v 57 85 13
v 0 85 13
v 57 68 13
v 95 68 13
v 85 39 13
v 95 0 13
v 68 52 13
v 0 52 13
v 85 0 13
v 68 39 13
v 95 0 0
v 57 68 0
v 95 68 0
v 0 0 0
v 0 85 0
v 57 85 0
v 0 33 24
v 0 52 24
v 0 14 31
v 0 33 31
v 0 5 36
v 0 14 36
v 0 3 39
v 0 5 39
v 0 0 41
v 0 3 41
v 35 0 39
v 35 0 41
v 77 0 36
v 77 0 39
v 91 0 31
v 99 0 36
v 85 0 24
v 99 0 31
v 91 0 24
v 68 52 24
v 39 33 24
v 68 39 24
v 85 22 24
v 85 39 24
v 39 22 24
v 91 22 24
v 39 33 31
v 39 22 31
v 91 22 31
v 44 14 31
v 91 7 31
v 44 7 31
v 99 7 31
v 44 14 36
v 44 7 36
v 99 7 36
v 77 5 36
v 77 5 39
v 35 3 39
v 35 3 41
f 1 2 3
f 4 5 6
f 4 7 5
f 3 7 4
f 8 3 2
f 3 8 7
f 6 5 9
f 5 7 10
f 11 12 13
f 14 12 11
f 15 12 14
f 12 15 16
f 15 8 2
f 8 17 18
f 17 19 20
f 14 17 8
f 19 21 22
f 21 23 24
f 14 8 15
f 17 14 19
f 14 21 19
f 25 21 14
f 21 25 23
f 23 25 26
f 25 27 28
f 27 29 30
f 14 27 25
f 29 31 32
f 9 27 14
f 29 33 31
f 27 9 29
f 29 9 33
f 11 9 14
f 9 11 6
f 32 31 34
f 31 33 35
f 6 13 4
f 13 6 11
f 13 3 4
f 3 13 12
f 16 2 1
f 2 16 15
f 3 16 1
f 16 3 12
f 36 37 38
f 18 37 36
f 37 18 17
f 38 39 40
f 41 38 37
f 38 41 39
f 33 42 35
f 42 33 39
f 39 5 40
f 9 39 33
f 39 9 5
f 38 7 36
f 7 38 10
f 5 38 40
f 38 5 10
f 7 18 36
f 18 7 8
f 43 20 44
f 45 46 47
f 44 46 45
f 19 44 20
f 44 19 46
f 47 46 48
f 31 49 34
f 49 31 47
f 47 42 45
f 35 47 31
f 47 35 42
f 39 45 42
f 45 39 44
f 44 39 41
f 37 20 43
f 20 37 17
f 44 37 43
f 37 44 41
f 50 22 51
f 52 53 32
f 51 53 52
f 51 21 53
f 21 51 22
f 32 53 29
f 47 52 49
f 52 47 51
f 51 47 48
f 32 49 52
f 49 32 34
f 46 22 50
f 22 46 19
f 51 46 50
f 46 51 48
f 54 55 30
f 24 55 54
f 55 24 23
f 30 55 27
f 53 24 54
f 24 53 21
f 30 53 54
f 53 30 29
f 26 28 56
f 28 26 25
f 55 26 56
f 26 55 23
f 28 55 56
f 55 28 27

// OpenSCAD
translate([9.5, 8.5, 6.5]) color([0.04413950751599882, 0.6453929548117466, 0.6988419541065013]) cube([19, 17, 13], center=true);
translate([28.5, 8.5, 6.5]) color([0.7967664255910738, 0.9116718921976609, 0.600448770579328]) cube([19, 17, 13], center=true);
translate([47.5, 8.5, 6.5]) color([0.7944487907838055, 0.1681613799771936, 0.9183995562433641]) cube([19, 17, 13], center=true);
translate([66.5, 8.5, 6.5]) color([0.9268586566852167, 0.40822611044352053, 0.4407066729290805]) cube([19, 17, 13], center=true);
translate([85.5, 8.5, 6.5]) color([0.6041418306666712, 0.6201352905963935, 0.25582819932935885]) cube([19, 17, 13], center=true);
translate([9.5, 25.5, 6.5]) color([0.3097428572381714, 0.8490920052212889, 0.453637908490201]) cube([19, 17, 13], center=true);
translate([28.5, 25.5, 6.5]) color([0.18066627555108494, 0.4537290543496928, 0.2641493990309046]) cube([19, 17, 13], center=true);
translate([47.5, 25.5, 6.5]) color([0.9492851375614021, 0.06409274308092405, 0.09630522223834415]) cube([19, 17, 13], center=true);
translate([66.5, 25.5, 6.5]) color([0.02618666999626429, 0.02133712304448243, 0.40376331371079255]) cube([19, 17, 13], center=true);
translate([85.5, 25.5, 6.5]) color([0.6905719463038024, 0.8969992176715027, 0.32280326974746465]) cube([19, 17, 13], center=true);
translate([9.5, 42.5, 6.5]) color([0.790755737975632, 0.7460115169857665, 0.6948475129606672]) cube([19, 17, 13], center=true);
translate([28.5, 42.5, 6.5]) color([0.47653257906772517, 0.8579766307154586, 0.5356136848189613]) cube([19, 17, 13], center=true);
translate([47.5, 42.5, 6.5]) color([0.4019331618452773, 0.783713898498177, 0.9254696984756191]) cube([19, 17, 13], center=true);
translate([66.5, 42.5, 6.5]) color([0.0277966234683793, 0.5158650286176655, 0.8365998776746773]) cube([19, 17, 13], center=true);
translate([85.5, 42.5, 6.5]) color([0.08009244005093674, 0.35854963179787425, 0.0984859129144442]) cube([19, 17, 13], center=true);
translate([9.5, 59.5, 6.5]) color([0.9681463616569913, 0.1542718478221884, 0.5165971564168642]) cube([19, 17, 13], center=true);
translate([28.5, 59.5, 6.5]) color([0.8047430089643692, 0.9598305824160865, 0.0007265089205383823]) cube([19, 17, 13], center=true);
translate([47.5, 59.5, 6.5]) color([0.33769105491683293, 0.9444140087685011, 0.6959768172121321]) cube([19, 17, 13], center=true);
translate([66.5, 59.5, 6.5]) color([0.16055826227824588, 0.7793255516951493, 0.1589752259859445]) cube([19, 17, 13], center=true);
translate([85.5, 59.5, 6.5]) color([0.6798370424105331, 0.9431536263145228, 0.9341404857092784]) cube([19, 17, 13], center=true);
translate([9.5, 76.5, 6.5]) color([0.32827049453258017, 0.023848105094706917, 0.9585798448912861]) cube([19, 17, 13], center=true);
translate([28.5, 76.5, 6.5]) color([0.6258377632382796, 0.3981042954636257, 0.2264255750200933]) cube([19, 17, 13], center=true);
translate([47.5, 76.5, 6.5]) color([0.6356717667101055, 0.328569085672622, 0.9662245753272395]) cube([19, 17, 13], center=true);
translate([8.5, 6.5, 18.5]) color([0.3520821722301851, 0.16362135021644642, 0.42074777530803376]) cube([17, 13, 11], center=true);
translate([25.5, 6.5, 18.5]) color([0.36328644213461747, 0.5653807754665455, 0.3865100485452896]) cube([17, 13, 11], center=true);
translate([42.5, 6.5, 18.5]) color([0.7707594112565195, 0.16214085318372695, 0.5836514905515098]) cube([17, 13, 11], center=true);
translate([59.5, 6.5, 18.5]) color([0.6869400768720183, 0.718467099976435, 0.17196229100139104]) cube([17, 13, 11], center=true);
translate([76.5, 6.5, 18.5]) color([0.14887881293527583, 0.025166107893626943, 0.32332346968418324]) cube([17, 13, 11], center=true);
translate([8.5, 19.5, 18.5]) color([0.003696799562737496, 0.04720529747843194, 0.9255571895234466]) cube([17, 13, 11], center=true);
translate([25.5, 19.5, 18.5]) color([0.573001262631075, 0.14769469781462263, 0.15315209085934545]) cube([17, 13, 11], center=true);
translate([42.5, 19.5, 18.5]) color([0.7868491215994531, 0.7877029182496789, 0.4187372508366701]) cube([17, 13, 11], center=true);
translate([59.5, 19.5, 18.5]) color([0.5680438273675328, 0.6864311496386182, 0.7112052310106062]) cube([17, 13, 11], center=true);
translate([76.5, 19.5, 18.5]) color([0.9225367392437966, 0.36402675889620517, 0.21666285047939615]) cube([17, 13, 11], center=true);
translate([8.5, 32.5, 18.5]) color([0.40038769746607716, 0.12979762559949215, 0.5661089096865166]) cube([17, 13, 11], center=true);
translate([25.5, 32.5, 18.5]) color([0.350592866287013, 0.09655676358596321, 0.8957043173613797]) cube([17, 13, 11], center=true);
translate([42.5, 32.5, 18.5]) color([0.24564542972396286, 0.3817592950540295, 0.9163373365613642]) cube([17, 13, 11], center=true);
translate([59.5, 32.5, 18.5]) color([0.24005472395766314, 0.4811830401201487, 0.9204180358452778]) cube([17, 13, 11], center=true);
translate([76.5, 32.5, 18.5]) color([0.06901768472479497, 0.25236871091997304, 0.2758752397078251]) cube([17, 13, 11], center=true);
translate([8.5, 45.5, 18.5]) color([0.526585946767007, 0.5423400552699501, 0.6040332809955223]) cube([17, 13, 11], center=true);
translate([25.5, 45.5, 18.5]) color([0.7795947303962014, 0.8767515811101877, 0.27628184885013174]) cube([17, 13, 11], center=true);
translate([42.5, 45.5, 18.5]) color([0.6109665581700968, 0.8673330381368943, 0.39077563557117434]) cube([17, 13, 11], center=true);
translate([59.5, 45.5, 18.5]) color([0.6261021875341246, 0.5344719952169016, 0.8525626141482417]) cube([17, 13, 11], center=true);
translate([6.5, 5.5, 27.5]) color([0.1442072370162294, 0.39242938925918713, 0.7677442686337953]) cube([13, 11, 7], center=true);
translate([19.5, 5.5, 27.5]) color([0.7310024639236243, 0.976490023680837, 0.432956620488795]) cube([13, 11, 7], center=true);
translate([32.5, 5.5, 27.5]) color([0.10481875176128097, 0.4606863677813431, 0.461987586031698]) cube([13, 11, 7], center=true);
translate([45.5, 5.5, 27.5]) color([0.16960878923904732, 0.4743590683571708, 0.15900931947085895]) cube([13, 11, 7], center=true);
translate([58.5, 5.5, 27.5]) color([0.9184122383299332, 0.8645912802495788, 0.7618309073415613]) cube([13, 11, 7], center=true);
translate([71.5, 5.5, 27.5]) color([0.1125156501937501, 0.36828247715101237, 0.14269334546182144]) cube([13, 11, 7], center=true);
translate([84.5, 5.5, 27.5]) color([0.3576212954978014, 0.47267833076618404, 0.5187172796832821]) cube([13, 11, 7], center=true);
translate([6.5, 16.5, 27.5]) color([0.05390524264941354, 0.8771386739413267, 0.25763233882857706]) cube([13, 11, 7], center=true);
translate([19.5, 16.5, 27.5]) color([0.7234564765071956, 0.3246711887124375, 0.3801134723009394]) cube([13, 11, 7], center=true);
translate([32.5, 16.5, 27.5]) color([0.04146251299314507, 0.5514350789130729, 0.03490092368589748]) cube([13, 11, 7], center=true);
translate([45.5, 16.5, 27.5]) color([0.4105469306488987, 0.3751623833766272, 0.20817480494735885]) cube([13, 11, 7], center=true);
translate([58.5, 16.5, 27.5]) color([0.13416269520041413, 0.11029894361740877, 0.3569637027811857]) cube([13, 11, 7], center=true);
translate([71.5, 16.5, 27.5]) color([0.03122581862343432, 0.5766961902260587, 0.46351932045943167]) cube([13, 11, 7], center=true);
translate([84.5, 16.5, 27.5]) color([0.6418946885374921, 0.7070356211127606, 0.07782501561786981]) cube([13, 11, 7], center=true);
translate([6.5, 27.5, 27.5]) color([0.42542790282452947, 0.7262099352025745, 0.1383007479401901]) cube([13, 11, 7], center=true);
translate([19.5, 27.5, 27.5]) color([0.15296819960671582, 0.16447153857536234, 0.02972250823157674]) cube([13, 11, 7], center=true);
translate([32.5, 27.5, 27.5]) color([0.13555611535148748, 0.49304209170471214, 0.8998582652350663]) cube([13, 11, 7], center=true);
translate([5.5, 3.5, 33.5]) color([0.6233506257524957, 0.28803948846792526, 0.7932252536354372]) cube([11, 7, 5], center=true);
translate([16.5, 3.5, 33.5]) color([0.6841926136499455, 0.8025617596714979, 0.9141286153689818]) cube([11, 7, 5], center=true);
translate([27.5, 3.5, 33.5]) color([0.8380916000073253, 0.7734206085146829, 0.26176851167691584]) cube([11, 7, 5], center=true);
translate([38.5, 3.5, 33.5]) color([0.15831969188506612, 0.6279762350139132, 0.968532274155243]) cube([11, 7, 5], center=true);
translate([49.5, 3.5, 33.5]) color([0.5331314108905011, 0.14458049768334114, 0.3761389701406963]) cube([11, 7, 5], center=true);
translate([60.5, 3.5, 33.5]) color([0.7397992144806613, 0.5554788507911738, 0.2345364606417215]) cube([11, 7, 5], center=true);
translate([71.5, 3.5, 33.5]) color([0.9148239194796951, 0.37856658806298793, 0.39026506951982043]) cube([11, 7, 5], center=true);
translate([82.5, 3.5, 33.5]) color([0.4712732695903361, 0.3061585200178283, 0.41010119017851343]) cube([11, 7, 5], center=true);
translate([93.5, 3.5, 33.5]) color([0.4062986061941243, 0.09771277519641097, 0.9732189413459187]) cube([11, 7, 5], center=true);
translate([5.5, 10.5, 33.5]) color([0.1476462111243403, 0.5834920525213394, 0.6340513654385499]) cube([11, 7, 5], center=true);
translate([16.5, 10.5, 33.5]) color([0.981030210372344, 0.8814881035470955, 0.10681393516694448]) cube([11, 7, 5], center=true);
translate([27.5, 10.5, 33.5]) color([0.7792822990369496, 0.6980706766614326, 0.5957858833990998]) cube([11, 7, 5], center=true);
translate([38.5, 10.5, 33.5]) color([0.6031315697857828, 0.513452068799622, 0.26667928463625334]) cube([11, 7, 5], center=true);
translate([3.5, 2.5, 37.5]) color([0.7319196359388911, 0.16863726359497544, 0.08537701363375594]) cube([7, 5, 3], center=true);
translate([10.5, 2.5, 37.5]) color([0.03602107622091366, 0.11539851048895433, 0.362166522572666]) cube([7, 5, 3], center=true);
translate([17.5, 2.5, 37.5]) color([0.7224633804016175, 0.31835367611154275, 0.6759746033894163]) cube([7, 5, 3], center=true);
translate([24.5, 2.5, 37.5]) color([0.3690945326108701, 0.6966804657420774, 0.6665423027167577]) cube([7, 5, 3], center=true);
translate([31.5, 2.5, 37.5]) color([0.8120877428034601, 0.22871566506275376, 0.1590470788005368]) cube([7, 5, 3], center=true);
translate([38.5, 2.5, 37.5]) color([0.551630898022963, 0.8946771329487354, 0.7805199910429719]) cube([7, 5, 3], center=true);
translate([45.5, 2.5, 37.5]) color([0.5079920956553113, 0.8859418345093829, 0.025781518425698202]) cube([7, 5, 3], center=true);
translate([52.5, 2.5, 37.5]) color([0.6432115126368863, 0.16681516080095515, 0.9937350713993572]) cube([7, 5, 3], center=true);
translate([59.5, 2.5, 37.5]) color([0.40890136814306854, 0.6606487125760558, 0.4381854363391663]) cube([7, 5, 3], center=true);
translate([66.5, 2.5, 37.5]) color([0.6836690634862878, 0.2641275750187716, 0.5874382639994257]) cube([7, 5, 3], center=true);
translate([73.5, 2.5, 37.5]) color([0.9196592523769888, 0.17133498851343842, 0.44096269879447136]) cube([7, 5, 3], center=true);
translate([2.5, 1.5, 40.0]) color([0.05365288940263557, 0.37504810787352794, 0.8023437119036539]) cube([5, 3, 2], center=true);
translate([7.5, 1.5, 40.0]) color([0.6440571739391641, 0.405188264955044, 0.23309555282291106]) cube([5, 3, 2], center=true);
translate([12.5, 1.5, 40.0]) color([0.8734163899386287, 0.03910603731828377, 0.6200029336050585]) cube([5, 3, 2], center=true);
translate([17.5, 1.5, 40.0]) color([0.26869184399515444, 0.5075002274683115, 0.5507921997084286]) cube([5, 3, 2], center=true);
translate([22.5, 1.5, 40.0]) color([0.3940908199003246, 0.26530695096417045, 0.22977064207941722]) cube([5, 3, 2], center=true);
translate([27.5, 1.5, 40.0]) color([0.36432219415560163, 0.30245362112059626, 0.608858680960566]) cube([5, 3, 2], center=true);
translate([32.5, 1.5, 40.0]) color([0.9168055515262393, 0.4569209446671899, 0.9624175881482058]) cube([5, 3, 2], center=true);
